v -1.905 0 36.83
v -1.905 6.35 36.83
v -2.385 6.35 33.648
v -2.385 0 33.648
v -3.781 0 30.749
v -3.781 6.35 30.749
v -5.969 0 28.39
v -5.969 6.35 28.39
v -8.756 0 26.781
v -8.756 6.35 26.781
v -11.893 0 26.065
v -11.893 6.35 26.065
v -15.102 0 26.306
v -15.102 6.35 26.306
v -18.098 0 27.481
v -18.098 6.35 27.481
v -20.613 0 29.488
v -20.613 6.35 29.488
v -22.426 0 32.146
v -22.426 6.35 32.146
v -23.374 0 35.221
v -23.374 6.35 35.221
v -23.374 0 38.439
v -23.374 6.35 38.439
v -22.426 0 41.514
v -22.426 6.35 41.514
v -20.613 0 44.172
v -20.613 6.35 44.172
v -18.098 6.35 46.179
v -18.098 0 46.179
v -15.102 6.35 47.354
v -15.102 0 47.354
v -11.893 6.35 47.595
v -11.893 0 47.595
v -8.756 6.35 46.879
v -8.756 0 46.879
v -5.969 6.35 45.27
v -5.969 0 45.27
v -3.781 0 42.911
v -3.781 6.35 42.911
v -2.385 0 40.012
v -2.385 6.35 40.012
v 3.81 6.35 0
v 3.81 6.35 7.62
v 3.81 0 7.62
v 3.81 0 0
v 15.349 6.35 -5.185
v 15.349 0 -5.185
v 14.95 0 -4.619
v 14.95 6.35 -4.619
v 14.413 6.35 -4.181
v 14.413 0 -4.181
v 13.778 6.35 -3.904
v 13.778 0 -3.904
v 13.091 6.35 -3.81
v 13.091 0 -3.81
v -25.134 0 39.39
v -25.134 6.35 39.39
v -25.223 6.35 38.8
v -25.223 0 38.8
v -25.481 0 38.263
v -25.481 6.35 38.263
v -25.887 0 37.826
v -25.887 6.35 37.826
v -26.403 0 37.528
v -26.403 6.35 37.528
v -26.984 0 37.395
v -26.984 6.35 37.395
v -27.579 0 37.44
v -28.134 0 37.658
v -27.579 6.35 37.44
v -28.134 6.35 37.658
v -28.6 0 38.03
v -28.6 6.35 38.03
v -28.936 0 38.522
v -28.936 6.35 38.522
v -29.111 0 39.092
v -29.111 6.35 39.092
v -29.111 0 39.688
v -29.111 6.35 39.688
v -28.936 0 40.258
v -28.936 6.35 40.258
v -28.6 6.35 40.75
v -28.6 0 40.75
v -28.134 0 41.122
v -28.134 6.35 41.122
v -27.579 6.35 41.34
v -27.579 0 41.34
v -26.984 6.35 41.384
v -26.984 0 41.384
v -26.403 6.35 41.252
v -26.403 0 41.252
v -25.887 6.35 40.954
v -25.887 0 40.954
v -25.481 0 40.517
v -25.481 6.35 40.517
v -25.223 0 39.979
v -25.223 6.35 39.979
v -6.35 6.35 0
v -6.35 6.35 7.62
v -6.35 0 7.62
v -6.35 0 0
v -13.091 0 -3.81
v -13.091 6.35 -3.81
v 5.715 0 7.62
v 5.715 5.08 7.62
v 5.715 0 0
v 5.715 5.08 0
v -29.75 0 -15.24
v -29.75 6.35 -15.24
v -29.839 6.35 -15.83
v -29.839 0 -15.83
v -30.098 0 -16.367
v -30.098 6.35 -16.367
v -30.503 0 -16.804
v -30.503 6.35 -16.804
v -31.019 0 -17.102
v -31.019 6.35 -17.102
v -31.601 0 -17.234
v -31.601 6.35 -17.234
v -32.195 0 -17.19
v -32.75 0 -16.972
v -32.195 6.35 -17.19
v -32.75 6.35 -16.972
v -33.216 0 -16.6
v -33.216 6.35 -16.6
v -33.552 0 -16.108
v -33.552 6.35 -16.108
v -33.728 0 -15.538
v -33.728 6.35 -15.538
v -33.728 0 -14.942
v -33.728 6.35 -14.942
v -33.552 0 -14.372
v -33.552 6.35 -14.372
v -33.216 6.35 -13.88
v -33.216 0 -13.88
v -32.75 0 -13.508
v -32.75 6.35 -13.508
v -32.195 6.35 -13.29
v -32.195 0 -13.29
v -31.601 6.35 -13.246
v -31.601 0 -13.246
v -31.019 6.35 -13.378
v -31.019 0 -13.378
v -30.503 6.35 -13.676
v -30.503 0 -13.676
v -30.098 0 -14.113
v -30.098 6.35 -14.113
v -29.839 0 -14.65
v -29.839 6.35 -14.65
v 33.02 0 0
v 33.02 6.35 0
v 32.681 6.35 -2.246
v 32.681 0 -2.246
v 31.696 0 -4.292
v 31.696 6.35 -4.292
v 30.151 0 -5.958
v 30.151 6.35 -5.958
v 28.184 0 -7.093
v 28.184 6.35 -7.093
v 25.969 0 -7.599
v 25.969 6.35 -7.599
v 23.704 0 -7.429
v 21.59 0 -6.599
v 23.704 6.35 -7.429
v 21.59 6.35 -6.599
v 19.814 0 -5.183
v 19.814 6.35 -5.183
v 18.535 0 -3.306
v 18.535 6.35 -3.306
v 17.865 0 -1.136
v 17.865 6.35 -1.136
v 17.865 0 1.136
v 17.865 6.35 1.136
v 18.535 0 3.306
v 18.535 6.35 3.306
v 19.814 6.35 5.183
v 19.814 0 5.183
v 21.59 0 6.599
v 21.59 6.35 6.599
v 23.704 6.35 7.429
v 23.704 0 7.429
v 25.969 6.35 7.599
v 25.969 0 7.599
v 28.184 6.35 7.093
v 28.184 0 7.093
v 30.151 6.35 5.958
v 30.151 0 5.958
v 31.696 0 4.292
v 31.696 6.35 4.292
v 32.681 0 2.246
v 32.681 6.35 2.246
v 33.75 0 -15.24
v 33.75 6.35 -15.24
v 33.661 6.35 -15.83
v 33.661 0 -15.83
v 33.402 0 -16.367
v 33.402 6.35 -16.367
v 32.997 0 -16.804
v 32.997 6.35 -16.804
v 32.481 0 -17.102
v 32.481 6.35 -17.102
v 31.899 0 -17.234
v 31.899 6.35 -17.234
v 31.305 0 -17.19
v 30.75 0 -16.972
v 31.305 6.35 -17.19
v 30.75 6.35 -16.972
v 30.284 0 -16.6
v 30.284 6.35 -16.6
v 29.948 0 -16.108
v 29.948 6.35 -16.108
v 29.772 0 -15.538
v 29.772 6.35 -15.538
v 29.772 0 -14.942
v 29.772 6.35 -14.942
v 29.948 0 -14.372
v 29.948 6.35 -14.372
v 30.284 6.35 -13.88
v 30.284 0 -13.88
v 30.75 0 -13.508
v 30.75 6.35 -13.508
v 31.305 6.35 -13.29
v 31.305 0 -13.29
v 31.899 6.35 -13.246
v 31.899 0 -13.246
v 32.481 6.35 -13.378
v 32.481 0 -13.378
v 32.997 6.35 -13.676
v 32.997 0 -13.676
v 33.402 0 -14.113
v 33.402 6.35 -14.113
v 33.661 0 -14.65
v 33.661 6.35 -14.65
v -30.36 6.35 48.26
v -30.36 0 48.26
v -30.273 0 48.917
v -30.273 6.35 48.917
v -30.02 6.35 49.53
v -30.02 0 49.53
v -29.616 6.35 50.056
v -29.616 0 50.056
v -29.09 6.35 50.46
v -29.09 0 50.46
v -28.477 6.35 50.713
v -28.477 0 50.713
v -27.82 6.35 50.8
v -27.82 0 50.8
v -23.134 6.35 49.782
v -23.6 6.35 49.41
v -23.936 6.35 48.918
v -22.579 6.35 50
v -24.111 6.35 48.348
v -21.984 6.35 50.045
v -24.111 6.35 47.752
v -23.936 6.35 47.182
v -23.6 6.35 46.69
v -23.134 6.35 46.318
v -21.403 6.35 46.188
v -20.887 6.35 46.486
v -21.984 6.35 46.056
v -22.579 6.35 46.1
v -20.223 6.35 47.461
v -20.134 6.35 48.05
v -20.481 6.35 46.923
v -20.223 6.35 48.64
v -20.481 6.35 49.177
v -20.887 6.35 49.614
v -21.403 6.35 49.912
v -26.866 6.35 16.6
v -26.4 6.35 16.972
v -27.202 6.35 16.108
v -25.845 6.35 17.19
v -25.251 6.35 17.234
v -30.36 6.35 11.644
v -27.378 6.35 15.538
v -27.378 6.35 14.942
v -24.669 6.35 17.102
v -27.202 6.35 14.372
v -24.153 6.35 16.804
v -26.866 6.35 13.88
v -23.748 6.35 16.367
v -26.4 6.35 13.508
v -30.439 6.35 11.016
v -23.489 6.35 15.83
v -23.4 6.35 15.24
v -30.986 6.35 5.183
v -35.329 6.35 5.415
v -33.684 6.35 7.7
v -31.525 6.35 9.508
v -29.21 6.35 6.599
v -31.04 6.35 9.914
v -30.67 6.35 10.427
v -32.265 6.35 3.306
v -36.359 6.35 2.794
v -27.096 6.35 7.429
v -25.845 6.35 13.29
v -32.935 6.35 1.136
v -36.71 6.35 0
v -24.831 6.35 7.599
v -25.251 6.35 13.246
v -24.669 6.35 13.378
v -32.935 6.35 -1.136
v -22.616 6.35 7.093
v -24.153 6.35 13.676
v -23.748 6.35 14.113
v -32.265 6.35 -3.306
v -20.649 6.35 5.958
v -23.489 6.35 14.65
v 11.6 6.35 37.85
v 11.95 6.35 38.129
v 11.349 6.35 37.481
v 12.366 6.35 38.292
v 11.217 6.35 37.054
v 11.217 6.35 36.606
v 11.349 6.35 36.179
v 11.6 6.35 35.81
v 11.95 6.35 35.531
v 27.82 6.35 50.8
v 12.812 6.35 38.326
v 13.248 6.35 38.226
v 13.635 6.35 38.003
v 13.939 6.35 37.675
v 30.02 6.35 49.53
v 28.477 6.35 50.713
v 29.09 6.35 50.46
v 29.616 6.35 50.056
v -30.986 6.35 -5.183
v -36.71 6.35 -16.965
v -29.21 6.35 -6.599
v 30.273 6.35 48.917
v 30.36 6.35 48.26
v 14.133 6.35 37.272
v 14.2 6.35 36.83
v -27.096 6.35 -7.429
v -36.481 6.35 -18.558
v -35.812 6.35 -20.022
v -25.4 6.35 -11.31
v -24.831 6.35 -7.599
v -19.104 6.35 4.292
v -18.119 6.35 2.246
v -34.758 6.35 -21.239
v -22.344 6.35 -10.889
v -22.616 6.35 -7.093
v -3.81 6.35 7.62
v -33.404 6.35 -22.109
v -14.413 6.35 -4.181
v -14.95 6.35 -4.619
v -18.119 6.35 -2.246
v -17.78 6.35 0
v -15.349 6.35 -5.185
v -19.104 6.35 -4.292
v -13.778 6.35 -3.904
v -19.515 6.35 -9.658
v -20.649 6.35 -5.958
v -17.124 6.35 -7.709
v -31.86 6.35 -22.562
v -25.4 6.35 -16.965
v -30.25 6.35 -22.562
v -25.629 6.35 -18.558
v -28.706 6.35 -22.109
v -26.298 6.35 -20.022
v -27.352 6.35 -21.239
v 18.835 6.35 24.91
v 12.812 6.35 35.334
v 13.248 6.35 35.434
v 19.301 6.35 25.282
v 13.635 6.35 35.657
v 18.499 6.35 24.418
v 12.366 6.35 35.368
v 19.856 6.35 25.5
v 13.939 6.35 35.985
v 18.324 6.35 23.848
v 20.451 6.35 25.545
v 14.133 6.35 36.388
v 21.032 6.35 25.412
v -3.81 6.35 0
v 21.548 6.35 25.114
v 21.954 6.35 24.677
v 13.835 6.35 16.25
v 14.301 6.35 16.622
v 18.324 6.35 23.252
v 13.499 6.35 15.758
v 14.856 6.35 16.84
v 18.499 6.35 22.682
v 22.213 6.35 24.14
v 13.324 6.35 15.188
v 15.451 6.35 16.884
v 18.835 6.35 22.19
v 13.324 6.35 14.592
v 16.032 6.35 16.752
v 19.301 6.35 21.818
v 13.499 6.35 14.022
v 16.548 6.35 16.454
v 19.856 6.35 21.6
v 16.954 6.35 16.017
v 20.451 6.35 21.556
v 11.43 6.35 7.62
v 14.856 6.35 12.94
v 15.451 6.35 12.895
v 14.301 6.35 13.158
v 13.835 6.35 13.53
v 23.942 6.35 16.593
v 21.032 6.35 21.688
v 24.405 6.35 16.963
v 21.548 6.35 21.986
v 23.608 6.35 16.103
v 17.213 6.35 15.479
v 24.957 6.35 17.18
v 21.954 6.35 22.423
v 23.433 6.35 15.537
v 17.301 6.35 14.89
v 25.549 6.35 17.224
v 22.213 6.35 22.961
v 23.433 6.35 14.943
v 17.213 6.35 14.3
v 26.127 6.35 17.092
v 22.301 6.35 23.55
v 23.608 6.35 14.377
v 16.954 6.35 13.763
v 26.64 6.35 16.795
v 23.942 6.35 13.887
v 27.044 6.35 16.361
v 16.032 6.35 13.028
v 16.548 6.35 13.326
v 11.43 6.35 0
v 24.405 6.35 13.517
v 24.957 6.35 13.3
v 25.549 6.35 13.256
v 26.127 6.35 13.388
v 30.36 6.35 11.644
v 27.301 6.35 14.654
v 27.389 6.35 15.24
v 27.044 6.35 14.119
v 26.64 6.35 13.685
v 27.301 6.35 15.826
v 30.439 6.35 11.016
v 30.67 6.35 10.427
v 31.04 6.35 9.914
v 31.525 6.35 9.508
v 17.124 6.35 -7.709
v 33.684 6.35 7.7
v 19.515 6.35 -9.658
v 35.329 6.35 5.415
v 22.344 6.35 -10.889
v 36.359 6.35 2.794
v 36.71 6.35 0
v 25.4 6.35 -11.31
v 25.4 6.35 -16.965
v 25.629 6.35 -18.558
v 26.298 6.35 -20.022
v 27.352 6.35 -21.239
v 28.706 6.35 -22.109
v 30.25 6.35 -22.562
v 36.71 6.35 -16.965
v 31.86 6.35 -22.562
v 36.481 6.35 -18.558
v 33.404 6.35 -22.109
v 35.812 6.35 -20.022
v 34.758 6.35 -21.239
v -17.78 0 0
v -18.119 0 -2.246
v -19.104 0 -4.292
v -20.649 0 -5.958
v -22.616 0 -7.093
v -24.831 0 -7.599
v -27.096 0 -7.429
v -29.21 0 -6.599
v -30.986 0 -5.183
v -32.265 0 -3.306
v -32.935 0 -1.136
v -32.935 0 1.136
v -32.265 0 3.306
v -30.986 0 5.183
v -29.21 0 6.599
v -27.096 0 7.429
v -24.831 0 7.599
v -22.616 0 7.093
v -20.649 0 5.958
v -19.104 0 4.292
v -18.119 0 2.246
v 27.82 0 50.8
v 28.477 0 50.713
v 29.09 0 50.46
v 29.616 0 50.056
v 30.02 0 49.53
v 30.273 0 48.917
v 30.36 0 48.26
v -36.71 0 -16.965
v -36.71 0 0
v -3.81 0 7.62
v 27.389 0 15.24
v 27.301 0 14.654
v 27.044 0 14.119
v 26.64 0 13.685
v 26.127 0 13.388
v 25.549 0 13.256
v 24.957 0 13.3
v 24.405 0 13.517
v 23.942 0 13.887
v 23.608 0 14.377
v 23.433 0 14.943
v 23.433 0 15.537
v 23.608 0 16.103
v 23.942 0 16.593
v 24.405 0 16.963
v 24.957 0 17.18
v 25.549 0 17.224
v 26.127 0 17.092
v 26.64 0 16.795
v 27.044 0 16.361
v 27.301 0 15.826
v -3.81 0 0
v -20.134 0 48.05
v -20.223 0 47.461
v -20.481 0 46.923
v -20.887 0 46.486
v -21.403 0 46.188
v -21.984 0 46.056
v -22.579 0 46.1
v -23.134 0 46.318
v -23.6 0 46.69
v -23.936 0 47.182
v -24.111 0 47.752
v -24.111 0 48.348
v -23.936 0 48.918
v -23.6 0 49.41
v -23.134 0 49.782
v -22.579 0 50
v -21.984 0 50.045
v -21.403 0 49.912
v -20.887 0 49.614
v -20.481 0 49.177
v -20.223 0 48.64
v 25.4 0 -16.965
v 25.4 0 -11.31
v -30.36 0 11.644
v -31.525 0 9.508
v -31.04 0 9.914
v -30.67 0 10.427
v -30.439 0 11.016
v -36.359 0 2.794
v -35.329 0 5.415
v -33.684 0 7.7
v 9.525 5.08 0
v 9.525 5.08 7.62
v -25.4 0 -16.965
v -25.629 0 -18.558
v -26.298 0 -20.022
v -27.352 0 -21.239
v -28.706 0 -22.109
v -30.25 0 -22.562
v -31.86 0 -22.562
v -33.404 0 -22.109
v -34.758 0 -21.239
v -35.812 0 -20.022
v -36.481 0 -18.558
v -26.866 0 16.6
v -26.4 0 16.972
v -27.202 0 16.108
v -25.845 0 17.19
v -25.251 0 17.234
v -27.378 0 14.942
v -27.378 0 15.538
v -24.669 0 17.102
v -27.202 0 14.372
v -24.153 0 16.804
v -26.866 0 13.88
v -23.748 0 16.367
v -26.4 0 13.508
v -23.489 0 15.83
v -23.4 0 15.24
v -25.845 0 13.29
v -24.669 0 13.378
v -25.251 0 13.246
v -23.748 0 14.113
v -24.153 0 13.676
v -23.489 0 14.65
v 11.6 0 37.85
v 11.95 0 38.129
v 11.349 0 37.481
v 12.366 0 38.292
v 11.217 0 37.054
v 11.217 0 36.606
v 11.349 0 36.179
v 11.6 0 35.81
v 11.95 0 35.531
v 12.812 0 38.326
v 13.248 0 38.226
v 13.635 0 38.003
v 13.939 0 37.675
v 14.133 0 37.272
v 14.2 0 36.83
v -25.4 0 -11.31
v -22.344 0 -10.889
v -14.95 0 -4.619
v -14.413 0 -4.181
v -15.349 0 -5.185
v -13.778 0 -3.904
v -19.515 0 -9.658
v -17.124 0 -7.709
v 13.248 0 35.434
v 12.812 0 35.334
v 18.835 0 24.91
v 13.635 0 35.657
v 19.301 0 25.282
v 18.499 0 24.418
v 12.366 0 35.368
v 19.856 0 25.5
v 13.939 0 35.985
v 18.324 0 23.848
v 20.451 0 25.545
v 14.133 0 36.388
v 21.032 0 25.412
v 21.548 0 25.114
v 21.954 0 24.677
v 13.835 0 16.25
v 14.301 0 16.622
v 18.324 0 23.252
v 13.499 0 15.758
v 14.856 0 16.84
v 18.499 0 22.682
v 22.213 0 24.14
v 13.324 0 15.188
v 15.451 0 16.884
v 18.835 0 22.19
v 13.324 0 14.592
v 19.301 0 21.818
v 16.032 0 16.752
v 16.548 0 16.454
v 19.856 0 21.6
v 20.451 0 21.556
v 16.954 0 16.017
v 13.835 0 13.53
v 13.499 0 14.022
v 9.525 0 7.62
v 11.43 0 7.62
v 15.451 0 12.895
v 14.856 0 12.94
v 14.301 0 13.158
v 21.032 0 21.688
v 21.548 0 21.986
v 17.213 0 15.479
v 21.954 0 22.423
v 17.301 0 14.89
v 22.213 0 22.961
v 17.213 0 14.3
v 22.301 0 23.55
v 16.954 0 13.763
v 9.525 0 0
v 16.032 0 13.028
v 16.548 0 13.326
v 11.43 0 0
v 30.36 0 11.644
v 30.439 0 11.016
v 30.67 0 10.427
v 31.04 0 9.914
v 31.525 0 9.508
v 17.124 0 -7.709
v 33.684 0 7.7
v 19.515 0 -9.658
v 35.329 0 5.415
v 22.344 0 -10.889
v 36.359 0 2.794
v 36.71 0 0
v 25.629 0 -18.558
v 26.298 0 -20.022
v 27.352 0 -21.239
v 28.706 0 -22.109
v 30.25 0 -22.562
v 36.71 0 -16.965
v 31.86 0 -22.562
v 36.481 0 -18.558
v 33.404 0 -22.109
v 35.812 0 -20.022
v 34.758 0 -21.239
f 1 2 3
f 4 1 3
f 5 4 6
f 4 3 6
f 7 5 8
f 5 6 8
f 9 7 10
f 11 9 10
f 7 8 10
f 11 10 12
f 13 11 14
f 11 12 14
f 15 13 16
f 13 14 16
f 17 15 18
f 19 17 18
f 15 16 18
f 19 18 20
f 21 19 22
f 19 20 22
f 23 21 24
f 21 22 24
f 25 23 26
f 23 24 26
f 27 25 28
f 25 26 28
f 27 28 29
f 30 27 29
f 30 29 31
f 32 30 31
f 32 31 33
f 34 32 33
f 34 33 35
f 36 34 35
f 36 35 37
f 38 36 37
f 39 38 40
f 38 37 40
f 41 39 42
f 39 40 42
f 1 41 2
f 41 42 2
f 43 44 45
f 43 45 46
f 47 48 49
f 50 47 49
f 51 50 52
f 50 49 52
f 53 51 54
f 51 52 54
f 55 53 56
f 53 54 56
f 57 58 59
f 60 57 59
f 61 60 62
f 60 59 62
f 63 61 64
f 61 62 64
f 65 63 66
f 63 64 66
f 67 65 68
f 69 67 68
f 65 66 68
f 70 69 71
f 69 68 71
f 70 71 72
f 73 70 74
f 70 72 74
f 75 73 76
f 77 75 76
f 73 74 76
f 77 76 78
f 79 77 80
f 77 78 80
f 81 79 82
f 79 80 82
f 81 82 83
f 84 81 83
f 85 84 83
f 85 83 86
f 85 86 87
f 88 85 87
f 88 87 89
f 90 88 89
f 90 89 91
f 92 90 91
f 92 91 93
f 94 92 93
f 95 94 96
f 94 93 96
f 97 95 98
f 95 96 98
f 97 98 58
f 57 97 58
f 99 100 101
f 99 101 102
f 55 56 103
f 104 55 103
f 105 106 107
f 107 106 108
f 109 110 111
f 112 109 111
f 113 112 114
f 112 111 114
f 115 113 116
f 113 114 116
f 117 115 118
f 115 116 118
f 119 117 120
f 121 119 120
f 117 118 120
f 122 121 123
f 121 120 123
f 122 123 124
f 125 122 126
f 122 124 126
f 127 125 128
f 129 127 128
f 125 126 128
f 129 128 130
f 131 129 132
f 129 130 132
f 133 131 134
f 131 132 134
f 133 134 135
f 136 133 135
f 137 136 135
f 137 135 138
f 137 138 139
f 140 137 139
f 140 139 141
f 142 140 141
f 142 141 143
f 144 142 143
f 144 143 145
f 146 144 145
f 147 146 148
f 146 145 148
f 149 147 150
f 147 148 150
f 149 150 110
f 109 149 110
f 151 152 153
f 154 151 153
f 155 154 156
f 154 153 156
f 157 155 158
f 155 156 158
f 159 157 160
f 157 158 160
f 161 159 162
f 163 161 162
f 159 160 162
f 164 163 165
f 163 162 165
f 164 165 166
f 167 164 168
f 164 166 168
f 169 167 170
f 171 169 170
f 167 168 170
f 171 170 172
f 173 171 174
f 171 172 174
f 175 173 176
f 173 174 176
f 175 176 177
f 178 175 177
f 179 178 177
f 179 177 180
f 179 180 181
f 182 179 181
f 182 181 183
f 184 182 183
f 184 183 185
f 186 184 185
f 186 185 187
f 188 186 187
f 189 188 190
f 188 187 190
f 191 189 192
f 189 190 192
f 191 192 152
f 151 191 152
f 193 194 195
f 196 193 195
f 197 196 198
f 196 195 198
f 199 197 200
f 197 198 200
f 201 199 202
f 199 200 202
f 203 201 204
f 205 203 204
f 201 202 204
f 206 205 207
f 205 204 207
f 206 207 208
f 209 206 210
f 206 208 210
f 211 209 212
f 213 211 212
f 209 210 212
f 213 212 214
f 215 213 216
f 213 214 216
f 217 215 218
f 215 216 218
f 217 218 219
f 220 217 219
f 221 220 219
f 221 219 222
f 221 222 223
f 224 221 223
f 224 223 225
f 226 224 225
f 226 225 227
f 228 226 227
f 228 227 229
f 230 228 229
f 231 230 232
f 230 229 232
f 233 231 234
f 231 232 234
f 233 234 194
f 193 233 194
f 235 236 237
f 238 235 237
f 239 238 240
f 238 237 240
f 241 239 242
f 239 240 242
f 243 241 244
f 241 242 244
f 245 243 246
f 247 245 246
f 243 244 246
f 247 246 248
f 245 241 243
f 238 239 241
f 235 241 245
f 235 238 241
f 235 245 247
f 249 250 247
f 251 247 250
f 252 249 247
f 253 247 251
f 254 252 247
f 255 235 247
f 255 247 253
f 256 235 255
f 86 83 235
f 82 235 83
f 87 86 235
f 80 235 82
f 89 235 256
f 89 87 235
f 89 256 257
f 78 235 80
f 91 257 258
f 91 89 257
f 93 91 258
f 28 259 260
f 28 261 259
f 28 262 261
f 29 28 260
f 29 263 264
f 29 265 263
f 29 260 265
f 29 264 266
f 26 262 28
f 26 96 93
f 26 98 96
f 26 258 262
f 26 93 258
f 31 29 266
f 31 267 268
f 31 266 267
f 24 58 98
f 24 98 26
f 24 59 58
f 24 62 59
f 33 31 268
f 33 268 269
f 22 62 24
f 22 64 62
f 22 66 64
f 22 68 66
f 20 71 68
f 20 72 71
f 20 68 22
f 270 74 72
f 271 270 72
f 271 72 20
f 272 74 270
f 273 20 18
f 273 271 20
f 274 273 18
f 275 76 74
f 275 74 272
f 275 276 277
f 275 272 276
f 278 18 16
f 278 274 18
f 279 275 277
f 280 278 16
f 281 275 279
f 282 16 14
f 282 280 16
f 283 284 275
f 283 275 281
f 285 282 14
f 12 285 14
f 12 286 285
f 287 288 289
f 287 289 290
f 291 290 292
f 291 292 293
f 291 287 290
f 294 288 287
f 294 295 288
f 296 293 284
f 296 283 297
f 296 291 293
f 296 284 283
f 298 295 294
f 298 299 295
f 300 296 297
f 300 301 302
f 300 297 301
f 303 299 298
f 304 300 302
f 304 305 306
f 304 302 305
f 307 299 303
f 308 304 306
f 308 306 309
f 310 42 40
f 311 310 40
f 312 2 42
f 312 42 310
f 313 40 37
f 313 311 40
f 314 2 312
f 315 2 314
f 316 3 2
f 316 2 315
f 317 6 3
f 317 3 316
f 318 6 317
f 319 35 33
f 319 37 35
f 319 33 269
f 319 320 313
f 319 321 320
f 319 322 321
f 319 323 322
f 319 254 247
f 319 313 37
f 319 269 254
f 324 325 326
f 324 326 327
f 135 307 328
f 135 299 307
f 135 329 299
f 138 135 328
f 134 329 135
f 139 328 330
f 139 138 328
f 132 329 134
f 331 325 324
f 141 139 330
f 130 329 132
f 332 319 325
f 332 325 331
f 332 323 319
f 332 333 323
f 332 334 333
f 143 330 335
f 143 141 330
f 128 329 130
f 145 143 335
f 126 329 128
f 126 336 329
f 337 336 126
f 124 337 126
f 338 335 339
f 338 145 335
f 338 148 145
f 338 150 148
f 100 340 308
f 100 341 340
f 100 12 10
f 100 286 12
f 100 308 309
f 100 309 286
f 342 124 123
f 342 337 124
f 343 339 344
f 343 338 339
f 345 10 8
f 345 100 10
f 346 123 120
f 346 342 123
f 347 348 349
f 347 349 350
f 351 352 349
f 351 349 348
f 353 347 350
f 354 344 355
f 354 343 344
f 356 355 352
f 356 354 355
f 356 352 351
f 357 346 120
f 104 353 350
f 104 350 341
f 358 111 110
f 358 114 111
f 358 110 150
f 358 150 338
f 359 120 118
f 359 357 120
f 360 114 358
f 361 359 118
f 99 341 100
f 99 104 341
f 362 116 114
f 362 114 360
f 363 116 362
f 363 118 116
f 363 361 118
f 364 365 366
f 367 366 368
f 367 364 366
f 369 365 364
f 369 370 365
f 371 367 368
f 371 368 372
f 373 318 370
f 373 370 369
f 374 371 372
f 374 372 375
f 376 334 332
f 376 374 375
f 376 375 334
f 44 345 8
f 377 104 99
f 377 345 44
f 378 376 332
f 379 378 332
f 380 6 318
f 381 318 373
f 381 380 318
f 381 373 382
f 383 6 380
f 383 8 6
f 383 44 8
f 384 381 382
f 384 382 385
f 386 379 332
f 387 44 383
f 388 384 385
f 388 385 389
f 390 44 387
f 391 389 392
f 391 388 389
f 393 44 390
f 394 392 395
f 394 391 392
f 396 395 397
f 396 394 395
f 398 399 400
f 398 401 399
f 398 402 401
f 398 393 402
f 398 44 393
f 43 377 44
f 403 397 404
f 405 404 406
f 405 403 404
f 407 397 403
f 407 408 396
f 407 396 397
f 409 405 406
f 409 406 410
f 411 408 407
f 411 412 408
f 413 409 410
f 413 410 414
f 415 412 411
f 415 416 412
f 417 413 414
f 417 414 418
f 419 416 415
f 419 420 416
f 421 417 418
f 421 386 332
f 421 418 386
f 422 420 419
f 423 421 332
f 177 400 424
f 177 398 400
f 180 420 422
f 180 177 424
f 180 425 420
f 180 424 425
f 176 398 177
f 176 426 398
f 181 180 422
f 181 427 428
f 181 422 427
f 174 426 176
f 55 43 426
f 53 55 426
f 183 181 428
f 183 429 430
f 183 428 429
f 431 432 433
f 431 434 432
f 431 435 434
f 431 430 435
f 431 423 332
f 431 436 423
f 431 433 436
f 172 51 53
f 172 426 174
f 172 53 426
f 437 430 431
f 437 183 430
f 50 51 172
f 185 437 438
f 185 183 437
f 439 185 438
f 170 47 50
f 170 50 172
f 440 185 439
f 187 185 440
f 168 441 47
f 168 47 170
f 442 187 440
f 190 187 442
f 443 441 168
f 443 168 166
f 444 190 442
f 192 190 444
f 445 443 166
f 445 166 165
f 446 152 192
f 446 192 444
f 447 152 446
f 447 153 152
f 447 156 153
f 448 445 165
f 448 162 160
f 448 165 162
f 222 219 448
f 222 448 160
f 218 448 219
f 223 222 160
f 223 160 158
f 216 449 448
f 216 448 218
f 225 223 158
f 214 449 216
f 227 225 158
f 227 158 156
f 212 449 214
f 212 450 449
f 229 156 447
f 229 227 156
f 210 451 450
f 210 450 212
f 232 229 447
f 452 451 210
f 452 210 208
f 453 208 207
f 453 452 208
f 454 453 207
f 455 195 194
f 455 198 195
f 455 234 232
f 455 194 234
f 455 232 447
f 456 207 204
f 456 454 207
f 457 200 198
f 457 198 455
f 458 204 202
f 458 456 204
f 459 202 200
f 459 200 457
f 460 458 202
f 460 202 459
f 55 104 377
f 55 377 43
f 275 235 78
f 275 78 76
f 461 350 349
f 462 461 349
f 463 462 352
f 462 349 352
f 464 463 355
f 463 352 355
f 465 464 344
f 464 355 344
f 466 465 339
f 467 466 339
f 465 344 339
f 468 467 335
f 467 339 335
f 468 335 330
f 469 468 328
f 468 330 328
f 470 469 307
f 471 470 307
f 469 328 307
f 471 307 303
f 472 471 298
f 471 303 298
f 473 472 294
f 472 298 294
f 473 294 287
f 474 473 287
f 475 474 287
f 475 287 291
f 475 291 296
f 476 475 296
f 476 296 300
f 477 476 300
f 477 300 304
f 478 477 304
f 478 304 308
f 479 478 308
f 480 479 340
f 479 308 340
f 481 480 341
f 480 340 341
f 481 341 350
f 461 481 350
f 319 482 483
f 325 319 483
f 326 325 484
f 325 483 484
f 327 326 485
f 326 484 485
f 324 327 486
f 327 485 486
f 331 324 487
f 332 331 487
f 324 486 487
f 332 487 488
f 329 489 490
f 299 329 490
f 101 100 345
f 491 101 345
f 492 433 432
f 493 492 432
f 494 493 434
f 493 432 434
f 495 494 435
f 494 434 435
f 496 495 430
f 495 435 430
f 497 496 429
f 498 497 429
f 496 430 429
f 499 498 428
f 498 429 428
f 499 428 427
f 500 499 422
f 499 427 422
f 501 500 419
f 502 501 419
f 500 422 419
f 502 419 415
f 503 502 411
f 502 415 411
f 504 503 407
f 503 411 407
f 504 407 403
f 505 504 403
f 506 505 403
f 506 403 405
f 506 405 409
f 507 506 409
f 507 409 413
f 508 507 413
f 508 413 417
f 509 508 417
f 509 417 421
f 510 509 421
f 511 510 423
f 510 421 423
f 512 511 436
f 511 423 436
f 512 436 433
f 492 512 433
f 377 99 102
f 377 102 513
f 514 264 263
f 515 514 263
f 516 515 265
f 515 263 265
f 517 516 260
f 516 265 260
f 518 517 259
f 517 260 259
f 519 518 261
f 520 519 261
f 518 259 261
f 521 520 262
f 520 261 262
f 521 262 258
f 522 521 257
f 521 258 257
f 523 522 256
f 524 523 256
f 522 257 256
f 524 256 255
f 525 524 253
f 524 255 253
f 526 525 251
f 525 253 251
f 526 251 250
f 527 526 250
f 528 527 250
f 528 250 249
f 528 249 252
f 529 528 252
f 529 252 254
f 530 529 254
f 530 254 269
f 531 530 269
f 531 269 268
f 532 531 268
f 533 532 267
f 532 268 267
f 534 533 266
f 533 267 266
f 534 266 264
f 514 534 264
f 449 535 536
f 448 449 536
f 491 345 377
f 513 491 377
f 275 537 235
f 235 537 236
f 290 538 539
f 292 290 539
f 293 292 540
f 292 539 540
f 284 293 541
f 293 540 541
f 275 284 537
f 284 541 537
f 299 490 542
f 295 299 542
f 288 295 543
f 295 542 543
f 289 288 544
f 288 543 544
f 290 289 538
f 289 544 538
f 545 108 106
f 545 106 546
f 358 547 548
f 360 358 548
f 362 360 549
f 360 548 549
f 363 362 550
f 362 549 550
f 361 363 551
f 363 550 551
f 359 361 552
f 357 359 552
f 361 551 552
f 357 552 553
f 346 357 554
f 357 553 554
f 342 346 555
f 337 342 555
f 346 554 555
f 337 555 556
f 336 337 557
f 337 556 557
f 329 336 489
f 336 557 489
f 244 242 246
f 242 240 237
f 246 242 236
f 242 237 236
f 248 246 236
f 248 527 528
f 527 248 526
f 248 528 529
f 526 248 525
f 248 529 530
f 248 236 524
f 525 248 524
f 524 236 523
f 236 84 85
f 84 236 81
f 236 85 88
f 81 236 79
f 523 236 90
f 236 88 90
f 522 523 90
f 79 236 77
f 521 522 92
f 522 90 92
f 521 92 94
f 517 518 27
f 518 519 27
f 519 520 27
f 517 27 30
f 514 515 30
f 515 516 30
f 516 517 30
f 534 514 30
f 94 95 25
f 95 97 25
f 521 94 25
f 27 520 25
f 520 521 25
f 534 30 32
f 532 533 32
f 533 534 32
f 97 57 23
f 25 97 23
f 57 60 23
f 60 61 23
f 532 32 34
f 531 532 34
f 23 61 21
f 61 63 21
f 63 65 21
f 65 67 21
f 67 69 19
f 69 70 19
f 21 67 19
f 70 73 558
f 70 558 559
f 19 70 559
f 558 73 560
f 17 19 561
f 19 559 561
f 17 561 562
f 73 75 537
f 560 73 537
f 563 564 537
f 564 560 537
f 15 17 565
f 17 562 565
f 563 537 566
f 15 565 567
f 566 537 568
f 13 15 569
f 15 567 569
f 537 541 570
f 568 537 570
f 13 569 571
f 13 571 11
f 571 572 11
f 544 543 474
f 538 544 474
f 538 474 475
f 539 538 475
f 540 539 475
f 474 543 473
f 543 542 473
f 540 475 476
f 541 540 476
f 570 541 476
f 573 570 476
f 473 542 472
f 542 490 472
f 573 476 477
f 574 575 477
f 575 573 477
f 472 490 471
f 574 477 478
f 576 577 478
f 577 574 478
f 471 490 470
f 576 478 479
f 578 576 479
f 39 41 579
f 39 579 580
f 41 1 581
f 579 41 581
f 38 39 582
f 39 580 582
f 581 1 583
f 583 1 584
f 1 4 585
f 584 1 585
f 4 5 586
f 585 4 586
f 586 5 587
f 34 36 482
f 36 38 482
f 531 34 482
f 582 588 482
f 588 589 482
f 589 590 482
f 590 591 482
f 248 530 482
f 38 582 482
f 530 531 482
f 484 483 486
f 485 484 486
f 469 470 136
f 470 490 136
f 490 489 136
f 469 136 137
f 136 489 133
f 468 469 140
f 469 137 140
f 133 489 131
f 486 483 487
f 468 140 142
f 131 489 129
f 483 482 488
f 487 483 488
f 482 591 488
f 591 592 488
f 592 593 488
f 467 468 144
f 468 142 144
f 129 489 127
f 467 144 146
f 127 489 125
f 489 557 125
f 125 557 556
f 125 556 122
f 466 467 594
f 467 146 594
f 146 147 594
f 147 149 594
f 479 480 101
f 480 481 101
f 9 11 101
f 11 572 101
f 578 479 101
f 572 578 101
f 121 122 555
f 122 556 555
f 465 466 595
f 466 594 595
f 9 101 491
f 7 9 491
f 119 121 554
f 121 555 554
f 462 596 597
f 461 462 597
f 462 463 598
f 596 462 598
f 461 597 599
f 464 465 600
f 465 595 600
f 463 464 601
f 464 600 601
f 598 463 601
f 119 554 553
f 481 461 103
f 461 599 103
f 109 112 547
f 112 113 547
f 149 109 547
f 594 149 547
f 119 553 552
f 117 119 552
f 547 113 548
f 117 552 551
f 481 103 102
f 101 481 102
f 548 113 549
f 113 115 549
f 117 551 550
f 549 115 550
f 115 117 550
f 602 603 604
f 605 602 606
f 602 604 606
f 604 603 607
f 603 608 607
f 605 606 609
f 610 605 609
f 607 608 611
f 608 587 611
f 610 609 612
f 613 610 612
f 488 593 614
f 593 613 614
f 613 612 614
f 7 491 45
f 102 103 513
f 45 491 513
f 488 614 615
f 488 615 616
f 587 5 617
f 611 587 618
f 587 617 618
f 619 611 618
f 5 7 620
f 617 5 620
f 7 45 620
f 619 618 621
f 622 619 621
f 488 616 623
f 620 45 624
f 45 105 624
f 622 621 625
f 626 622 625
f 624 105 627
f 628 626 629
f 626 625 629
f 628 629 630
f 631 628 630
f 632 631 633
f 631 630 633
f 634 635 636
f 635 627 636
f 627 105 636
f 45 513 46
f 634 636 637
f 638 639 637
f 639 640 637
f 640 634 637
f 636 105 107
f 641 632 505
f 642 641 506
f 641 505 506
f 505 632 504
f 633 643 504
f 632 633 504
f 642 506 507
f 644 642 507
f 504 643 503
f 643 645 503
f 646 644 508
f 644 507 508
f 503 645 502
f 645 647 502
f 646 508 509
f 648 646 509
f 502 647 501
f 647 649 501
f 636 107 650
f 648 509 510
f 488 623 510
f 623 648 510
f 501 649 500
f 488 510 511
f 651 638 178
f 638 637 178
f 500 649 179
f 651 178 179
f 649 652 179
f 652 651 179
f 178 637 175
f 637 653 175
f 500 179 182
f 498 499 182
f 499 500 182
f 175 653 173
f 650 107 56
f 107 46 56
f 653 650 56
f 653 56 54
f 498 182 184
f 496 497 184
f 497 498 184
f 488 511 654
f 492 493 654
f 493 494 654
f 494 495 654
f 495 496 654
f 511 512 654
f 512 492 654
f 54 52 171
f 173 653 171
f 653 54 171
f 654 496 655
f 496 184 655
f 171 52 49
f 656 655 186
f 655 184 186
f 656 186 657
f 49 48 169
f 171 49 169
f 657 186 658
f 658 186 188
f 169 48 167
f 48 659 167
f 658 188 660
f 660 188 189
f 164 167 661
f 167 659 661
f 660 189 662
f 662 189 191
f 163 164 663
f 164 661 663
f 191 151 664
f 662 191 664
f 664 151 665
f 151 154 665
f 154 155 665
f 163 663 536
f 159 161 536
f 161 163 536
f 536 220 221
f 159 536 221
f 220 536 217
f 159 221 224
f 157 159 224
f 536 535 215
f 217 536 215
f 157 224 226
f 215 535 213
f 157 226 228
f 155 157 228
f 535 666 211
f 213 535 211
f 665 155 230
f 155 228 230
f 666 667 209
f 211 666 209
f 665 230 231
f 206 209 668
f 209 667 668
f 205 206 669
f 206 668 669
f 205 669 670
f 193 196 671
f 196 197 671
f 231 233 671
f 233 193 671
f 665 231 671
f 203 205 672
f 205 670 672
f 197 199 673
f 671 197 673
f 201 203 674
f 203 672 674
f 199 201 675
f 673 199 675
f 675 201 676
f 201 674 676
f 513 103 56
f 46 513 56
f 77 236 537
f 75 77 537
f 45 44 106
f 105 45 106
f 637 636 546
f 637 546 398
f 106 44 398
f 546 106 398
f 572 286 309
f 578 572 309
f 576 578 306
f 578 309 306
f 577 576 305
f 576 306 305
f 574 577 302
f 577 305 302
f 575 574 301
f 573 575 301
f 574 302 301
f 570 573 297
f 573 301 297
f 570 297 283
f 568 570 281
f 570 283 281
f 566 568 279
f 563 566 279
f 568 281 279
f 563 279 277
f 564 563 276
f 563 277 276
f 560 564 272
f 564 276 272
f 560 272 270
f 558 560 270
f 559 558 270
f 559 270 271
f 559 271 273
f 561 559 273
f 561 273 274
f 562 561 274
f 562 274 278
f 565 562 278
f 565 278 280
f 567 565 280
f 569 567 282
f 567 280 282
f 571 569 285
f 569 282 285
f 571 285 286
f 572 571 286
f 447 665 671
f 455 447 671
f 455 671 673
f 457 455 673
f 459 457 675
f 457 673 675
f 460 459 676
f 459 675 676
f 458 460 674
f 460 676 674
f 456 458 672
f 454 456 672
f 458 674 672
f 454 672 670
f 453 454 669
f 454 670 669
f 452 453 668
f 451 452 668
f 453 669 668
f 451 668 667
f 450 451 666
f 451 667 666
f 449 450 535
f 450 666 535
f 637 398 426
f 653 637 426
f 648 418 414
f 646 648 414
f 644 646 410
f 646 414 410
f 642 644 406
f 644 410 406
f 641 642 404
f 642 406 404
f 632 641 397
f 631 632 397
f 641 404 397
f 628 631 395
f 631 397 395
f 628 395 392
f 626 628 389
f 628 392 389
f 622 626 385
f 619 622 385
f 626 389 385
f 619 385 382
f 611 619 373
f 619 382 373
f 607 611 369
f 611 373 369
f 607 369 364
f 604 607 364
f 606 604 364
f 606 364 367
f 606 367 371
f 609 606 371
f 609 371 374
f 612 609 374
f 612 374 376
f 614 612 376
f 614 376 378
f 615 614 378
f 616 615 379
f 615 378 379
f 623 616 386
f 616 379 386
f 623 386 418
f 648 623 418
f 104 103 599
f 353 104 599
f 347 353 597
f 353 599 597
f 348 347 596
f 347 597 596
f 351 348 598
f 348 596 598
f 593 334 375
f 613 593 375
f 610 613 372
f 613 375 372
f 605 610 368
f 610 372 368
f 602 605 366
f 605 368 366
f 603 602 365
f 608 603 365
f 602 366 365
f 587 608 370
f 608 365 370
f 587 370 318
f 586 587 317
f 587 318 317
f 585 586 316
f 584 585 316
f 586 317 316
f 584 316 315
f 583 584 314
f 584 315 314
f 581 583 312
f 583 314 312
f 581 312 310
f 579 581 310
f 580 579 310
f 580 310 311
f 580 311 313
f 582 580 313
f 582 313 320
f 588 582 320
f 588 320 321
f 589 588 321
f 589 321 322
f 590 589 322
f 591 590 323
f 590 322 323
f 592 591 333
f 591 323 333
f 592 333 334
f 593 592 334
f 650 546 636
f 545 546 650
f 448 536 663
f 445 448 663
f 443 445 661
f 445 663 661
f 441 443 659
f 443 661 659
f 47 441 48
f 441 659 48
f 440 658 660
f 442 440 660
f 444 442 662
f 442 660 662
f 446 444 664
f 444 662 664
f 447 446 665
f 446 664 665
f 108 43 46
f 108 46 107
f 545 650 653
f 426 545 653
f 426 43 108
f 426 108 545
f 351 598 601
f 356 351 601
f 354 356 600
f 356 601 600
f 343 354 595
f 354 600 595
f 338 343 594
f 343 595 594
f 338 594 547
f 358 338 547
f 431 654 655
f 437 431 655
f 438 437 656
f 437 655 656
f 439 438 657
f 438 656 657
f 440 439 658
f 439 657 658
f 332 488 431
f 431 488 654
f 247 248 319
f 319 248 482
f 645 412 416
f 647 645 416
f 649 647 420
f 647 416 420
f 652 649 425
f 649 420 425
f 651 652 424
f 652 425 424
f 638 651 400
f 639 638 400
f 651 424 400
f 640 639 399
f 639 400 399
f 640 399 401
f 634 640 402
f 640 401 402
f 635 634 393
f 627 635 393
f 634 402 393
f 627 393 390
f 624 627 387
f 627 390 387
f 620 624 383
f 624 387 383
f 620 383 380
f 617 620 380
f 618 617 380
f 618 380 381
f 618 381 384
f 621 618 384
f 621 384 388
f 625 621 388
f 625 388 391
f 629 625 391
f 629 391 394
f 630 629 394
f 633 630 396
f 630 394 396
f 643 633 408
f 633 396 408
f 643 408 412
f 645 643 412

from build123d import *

# Parameters (mm, degrees)
BOSS_EXTRUDE2_DEPTH = 6.35
SKETCH6_W           = 2.54
SKETCH6_H           = 7.62
SKETCH6_W_2         = 1.905
CUT_EXTRUDE3_DEPTH  = 6.35
SKETCH7_R           = 10.795
SKETCH7_R_2         = 1.5
CUT_EXTRUDE4_DEPTH  = 6.35
SKETCH10_R          = 7.62
CUT_EXTRUDE6_DEPTH  = 6.35
SKETCH11_W          = 3.81
SKETCH11_H          = 7.62
CUT_EXTRUDE7_DEPTH  = 1.27
SKETCH8_R           = 2
SKETCH8_R_2         = 1.989430384
CUT_EXTRUDE8_DEPTH  = 6.35
SKETCH12_R          = 2
CUT_EXTRUDE9_DEPTH  = 6.35


with BuildPart() as part:
    # Sketch3 → Boss-Extrude2 (new body)
    with BuildSketch(Plane(origin=(0, 0, 0), x_dir=(1, 0, 0), z_dir=(0, 1, 0))):
        with BuildLine():
            Line((-27.819999986, -50.8), (-16.461471842, -50.8))
            Line((-16.461471842, -50.8), (4.000849576, -50.8))
            Line((4.000849576, -50.8), (23.297417358, -50.8))
            Line((23.297417358, -50.8), (27.819999986, -50.8))
            ThreePointArc((27.819999986, -50.8), (29.61605121, -50.056051224), (30.359999986, -48.26))
            Line((30.359999986, -48.26), (30.359999986, -11.643560444))
            ThreePointArc((30.359999986, -11.643560444), (30.670062071, -10.427428504), (31.524548724, -9.508207119))
            ThreePointArc((31.524548724, -9.508207119), (35.329369206, -5.415138673), (36.709999986, 0))
            Line((36.709999986, 0), (36.709999986, 16.964999979))
            ThreePointArc((36.709999986, 16.964999979), (31.054999993, 22.619999972), (25.4, 16.964999979))
            Line((25.4, 16.964999979), (25.4, 11.309999986))
            ThreePointArc((25.4, 11.309999986), (19.514906714, 9.658249153), (15.348771474, 5.185451262))
            ThreePointArc((15.348771474, 5.185451262), (14.413140747, 4.180950232), (13.091466391, 3.81))
            Line((13.091466391, 3.81), (-13.091466391, 3.81))
            ThreePointArc((-13.091466391, 3.81), (-14.413140747, 4.180950232), (-15.348771474, 5.185451262))
            ThreePointArc((-15.348771474, 5.185451262), (-19.514906714, 9.658249153), (-25.4, 11.309999986))
            Line((-25.4, 11.309999986), (-25.4, 16.964999979))
            ThreePointArc((-25.4, 16.964999979), (-31.054999993, 22.619999972), (-36.709999986, 16.964999979))
            Line((-36.709999986, 16.964999979), (-36.709999986, 0))
            ThreePointArc((-36.709999986, 0), (-35.329369206, -5.415138673), (-31.524548724, -9.508207119))
            ThreePointArc((-31.524548724, -9.508207119), (-30.670062071, -10.427428504), (-30.359999986, -11.643560444))
            Line((-30.359999986, -11.643560444), (-30.359999986, -48.26))
            ThreePointArc((-30.359999986, -48.26), (-29.61605121, -50.056051224), (-27.819999986, -50.8))
        make_face()
    extrude(amount=BOSS_EXTRUDE2_DEPTH)

    # Sketch6 → Cut-Extrude3 (cut)
    with BuildSketch(Plane(origin=(0, 6.35, 0), x_dir=(1, 0, 0), z_dir=(0, 1, 0))):
        with Locations((-5.08, -3.81)):
            Rectangle(SKETCH6_W, SKETCH6_H)
        with Locations((4.7625, -3.81)):
            Rectangle(SKETCH6_W_2, SKETCH6_H)
        with Locations((10.4775, -3.81)):
            Rectangle(SKETCH6_W_2, SKETCH6_H)
    extrude(amount=-CUT_EXTRUDE3_DEPTH, mode=Mode.SUBTRACT)

    # Sketch7 → Cut-Extrude4 (cut)
    with BuildSketch(Plane(origin=(0, 6.35, 0), x_dir=(1, 0, 0), z_dir=(0, 1, 0))):
        with Locations((-12.7, -36.83)):
            Circle(SKETCH7_R)
        with Locations((12.7, -36.83)):
            Circle(SKETCH7_R_2)
    extrude(amount=-CUT_EXTRUDE4_DEPTH, mode=Mode.SUBTRACT)

    # Sketch10 → Cut-Extrude6 (cut)
    with BuildSketch(Plane(origin=(0, 6.35, 0), x_dir=(1, 0, 0), z_dir=(0, 1, 0))):
        with Locations((-25.4, 0)):
            Circle(SKETCH10_R)
        with Locations((25.4, 0)):
            Circle(SKETCH10_R)
    extrude(amount=-CUT_EXTRUDE6_DEPTH, mode=Mode.SUBTRACT)

    # Sketch11 → Cut-Extrude7 (cut)
    with BuildSketch(Plane(origin=(0, 6.35, 0), x_dir=(1, 0, 0), z_dir=(0, 1, 0))):
        with Locations((7.62, -3.81)):
            Rectangle(SKETCH11_W, SKETCH11_H)
    extrude(amount=-CUT_EXTRUDE7_DEPTH, mode=Mode.SUBTRACT)

    # Sketch8 → Cut-Extrude8 (cut)
    with BuildSketch(Plane(origin=(0, 6.35, 0), x_dir=(1, 0, 0), z_dir=(0, 1, 0))):
        with Locations((-31.75, 15.24)):
            Circle(SKETCH8_R)
        with Locations((-25.4, -15.24)):
            Circle(SKETCH8_R)
        with Locations((25.4, -15.24)):
            Circle(SKETCH8_R_2)
        with Locations((31.75, 15.24)):
            Circle(SKETCH8_R)
    extrude(amount=-CUT_EXTRUDE8_DEPTH, mode=Mode.SUBTRACT)

    # Sketch12 → Cut-Extrude9 (cut)
    with BuildSketch(Plane(origin=(0, 6.35, 0), x_dir=(1, 0, 0), z_dir=(0, 1, 0))):
        with Locations((15.301414721, -14.889872981)):
            Circle(SKETCH12_R)
        with Locations((20.301414721, -23.550127019)):
            Circle(SKETCH12_R)
        with Locations((-22.133830064, -48.050127019)):
            Circle(SKETCH12_R)
        with Locations((-27.133830064, -39.389872981)):
            Circle(SKETCH12_R)
    extrude(amount=-CUT_EXTRUDE9_DEPTH, mode=Mode.SUBTRACT)


solid = part.part
